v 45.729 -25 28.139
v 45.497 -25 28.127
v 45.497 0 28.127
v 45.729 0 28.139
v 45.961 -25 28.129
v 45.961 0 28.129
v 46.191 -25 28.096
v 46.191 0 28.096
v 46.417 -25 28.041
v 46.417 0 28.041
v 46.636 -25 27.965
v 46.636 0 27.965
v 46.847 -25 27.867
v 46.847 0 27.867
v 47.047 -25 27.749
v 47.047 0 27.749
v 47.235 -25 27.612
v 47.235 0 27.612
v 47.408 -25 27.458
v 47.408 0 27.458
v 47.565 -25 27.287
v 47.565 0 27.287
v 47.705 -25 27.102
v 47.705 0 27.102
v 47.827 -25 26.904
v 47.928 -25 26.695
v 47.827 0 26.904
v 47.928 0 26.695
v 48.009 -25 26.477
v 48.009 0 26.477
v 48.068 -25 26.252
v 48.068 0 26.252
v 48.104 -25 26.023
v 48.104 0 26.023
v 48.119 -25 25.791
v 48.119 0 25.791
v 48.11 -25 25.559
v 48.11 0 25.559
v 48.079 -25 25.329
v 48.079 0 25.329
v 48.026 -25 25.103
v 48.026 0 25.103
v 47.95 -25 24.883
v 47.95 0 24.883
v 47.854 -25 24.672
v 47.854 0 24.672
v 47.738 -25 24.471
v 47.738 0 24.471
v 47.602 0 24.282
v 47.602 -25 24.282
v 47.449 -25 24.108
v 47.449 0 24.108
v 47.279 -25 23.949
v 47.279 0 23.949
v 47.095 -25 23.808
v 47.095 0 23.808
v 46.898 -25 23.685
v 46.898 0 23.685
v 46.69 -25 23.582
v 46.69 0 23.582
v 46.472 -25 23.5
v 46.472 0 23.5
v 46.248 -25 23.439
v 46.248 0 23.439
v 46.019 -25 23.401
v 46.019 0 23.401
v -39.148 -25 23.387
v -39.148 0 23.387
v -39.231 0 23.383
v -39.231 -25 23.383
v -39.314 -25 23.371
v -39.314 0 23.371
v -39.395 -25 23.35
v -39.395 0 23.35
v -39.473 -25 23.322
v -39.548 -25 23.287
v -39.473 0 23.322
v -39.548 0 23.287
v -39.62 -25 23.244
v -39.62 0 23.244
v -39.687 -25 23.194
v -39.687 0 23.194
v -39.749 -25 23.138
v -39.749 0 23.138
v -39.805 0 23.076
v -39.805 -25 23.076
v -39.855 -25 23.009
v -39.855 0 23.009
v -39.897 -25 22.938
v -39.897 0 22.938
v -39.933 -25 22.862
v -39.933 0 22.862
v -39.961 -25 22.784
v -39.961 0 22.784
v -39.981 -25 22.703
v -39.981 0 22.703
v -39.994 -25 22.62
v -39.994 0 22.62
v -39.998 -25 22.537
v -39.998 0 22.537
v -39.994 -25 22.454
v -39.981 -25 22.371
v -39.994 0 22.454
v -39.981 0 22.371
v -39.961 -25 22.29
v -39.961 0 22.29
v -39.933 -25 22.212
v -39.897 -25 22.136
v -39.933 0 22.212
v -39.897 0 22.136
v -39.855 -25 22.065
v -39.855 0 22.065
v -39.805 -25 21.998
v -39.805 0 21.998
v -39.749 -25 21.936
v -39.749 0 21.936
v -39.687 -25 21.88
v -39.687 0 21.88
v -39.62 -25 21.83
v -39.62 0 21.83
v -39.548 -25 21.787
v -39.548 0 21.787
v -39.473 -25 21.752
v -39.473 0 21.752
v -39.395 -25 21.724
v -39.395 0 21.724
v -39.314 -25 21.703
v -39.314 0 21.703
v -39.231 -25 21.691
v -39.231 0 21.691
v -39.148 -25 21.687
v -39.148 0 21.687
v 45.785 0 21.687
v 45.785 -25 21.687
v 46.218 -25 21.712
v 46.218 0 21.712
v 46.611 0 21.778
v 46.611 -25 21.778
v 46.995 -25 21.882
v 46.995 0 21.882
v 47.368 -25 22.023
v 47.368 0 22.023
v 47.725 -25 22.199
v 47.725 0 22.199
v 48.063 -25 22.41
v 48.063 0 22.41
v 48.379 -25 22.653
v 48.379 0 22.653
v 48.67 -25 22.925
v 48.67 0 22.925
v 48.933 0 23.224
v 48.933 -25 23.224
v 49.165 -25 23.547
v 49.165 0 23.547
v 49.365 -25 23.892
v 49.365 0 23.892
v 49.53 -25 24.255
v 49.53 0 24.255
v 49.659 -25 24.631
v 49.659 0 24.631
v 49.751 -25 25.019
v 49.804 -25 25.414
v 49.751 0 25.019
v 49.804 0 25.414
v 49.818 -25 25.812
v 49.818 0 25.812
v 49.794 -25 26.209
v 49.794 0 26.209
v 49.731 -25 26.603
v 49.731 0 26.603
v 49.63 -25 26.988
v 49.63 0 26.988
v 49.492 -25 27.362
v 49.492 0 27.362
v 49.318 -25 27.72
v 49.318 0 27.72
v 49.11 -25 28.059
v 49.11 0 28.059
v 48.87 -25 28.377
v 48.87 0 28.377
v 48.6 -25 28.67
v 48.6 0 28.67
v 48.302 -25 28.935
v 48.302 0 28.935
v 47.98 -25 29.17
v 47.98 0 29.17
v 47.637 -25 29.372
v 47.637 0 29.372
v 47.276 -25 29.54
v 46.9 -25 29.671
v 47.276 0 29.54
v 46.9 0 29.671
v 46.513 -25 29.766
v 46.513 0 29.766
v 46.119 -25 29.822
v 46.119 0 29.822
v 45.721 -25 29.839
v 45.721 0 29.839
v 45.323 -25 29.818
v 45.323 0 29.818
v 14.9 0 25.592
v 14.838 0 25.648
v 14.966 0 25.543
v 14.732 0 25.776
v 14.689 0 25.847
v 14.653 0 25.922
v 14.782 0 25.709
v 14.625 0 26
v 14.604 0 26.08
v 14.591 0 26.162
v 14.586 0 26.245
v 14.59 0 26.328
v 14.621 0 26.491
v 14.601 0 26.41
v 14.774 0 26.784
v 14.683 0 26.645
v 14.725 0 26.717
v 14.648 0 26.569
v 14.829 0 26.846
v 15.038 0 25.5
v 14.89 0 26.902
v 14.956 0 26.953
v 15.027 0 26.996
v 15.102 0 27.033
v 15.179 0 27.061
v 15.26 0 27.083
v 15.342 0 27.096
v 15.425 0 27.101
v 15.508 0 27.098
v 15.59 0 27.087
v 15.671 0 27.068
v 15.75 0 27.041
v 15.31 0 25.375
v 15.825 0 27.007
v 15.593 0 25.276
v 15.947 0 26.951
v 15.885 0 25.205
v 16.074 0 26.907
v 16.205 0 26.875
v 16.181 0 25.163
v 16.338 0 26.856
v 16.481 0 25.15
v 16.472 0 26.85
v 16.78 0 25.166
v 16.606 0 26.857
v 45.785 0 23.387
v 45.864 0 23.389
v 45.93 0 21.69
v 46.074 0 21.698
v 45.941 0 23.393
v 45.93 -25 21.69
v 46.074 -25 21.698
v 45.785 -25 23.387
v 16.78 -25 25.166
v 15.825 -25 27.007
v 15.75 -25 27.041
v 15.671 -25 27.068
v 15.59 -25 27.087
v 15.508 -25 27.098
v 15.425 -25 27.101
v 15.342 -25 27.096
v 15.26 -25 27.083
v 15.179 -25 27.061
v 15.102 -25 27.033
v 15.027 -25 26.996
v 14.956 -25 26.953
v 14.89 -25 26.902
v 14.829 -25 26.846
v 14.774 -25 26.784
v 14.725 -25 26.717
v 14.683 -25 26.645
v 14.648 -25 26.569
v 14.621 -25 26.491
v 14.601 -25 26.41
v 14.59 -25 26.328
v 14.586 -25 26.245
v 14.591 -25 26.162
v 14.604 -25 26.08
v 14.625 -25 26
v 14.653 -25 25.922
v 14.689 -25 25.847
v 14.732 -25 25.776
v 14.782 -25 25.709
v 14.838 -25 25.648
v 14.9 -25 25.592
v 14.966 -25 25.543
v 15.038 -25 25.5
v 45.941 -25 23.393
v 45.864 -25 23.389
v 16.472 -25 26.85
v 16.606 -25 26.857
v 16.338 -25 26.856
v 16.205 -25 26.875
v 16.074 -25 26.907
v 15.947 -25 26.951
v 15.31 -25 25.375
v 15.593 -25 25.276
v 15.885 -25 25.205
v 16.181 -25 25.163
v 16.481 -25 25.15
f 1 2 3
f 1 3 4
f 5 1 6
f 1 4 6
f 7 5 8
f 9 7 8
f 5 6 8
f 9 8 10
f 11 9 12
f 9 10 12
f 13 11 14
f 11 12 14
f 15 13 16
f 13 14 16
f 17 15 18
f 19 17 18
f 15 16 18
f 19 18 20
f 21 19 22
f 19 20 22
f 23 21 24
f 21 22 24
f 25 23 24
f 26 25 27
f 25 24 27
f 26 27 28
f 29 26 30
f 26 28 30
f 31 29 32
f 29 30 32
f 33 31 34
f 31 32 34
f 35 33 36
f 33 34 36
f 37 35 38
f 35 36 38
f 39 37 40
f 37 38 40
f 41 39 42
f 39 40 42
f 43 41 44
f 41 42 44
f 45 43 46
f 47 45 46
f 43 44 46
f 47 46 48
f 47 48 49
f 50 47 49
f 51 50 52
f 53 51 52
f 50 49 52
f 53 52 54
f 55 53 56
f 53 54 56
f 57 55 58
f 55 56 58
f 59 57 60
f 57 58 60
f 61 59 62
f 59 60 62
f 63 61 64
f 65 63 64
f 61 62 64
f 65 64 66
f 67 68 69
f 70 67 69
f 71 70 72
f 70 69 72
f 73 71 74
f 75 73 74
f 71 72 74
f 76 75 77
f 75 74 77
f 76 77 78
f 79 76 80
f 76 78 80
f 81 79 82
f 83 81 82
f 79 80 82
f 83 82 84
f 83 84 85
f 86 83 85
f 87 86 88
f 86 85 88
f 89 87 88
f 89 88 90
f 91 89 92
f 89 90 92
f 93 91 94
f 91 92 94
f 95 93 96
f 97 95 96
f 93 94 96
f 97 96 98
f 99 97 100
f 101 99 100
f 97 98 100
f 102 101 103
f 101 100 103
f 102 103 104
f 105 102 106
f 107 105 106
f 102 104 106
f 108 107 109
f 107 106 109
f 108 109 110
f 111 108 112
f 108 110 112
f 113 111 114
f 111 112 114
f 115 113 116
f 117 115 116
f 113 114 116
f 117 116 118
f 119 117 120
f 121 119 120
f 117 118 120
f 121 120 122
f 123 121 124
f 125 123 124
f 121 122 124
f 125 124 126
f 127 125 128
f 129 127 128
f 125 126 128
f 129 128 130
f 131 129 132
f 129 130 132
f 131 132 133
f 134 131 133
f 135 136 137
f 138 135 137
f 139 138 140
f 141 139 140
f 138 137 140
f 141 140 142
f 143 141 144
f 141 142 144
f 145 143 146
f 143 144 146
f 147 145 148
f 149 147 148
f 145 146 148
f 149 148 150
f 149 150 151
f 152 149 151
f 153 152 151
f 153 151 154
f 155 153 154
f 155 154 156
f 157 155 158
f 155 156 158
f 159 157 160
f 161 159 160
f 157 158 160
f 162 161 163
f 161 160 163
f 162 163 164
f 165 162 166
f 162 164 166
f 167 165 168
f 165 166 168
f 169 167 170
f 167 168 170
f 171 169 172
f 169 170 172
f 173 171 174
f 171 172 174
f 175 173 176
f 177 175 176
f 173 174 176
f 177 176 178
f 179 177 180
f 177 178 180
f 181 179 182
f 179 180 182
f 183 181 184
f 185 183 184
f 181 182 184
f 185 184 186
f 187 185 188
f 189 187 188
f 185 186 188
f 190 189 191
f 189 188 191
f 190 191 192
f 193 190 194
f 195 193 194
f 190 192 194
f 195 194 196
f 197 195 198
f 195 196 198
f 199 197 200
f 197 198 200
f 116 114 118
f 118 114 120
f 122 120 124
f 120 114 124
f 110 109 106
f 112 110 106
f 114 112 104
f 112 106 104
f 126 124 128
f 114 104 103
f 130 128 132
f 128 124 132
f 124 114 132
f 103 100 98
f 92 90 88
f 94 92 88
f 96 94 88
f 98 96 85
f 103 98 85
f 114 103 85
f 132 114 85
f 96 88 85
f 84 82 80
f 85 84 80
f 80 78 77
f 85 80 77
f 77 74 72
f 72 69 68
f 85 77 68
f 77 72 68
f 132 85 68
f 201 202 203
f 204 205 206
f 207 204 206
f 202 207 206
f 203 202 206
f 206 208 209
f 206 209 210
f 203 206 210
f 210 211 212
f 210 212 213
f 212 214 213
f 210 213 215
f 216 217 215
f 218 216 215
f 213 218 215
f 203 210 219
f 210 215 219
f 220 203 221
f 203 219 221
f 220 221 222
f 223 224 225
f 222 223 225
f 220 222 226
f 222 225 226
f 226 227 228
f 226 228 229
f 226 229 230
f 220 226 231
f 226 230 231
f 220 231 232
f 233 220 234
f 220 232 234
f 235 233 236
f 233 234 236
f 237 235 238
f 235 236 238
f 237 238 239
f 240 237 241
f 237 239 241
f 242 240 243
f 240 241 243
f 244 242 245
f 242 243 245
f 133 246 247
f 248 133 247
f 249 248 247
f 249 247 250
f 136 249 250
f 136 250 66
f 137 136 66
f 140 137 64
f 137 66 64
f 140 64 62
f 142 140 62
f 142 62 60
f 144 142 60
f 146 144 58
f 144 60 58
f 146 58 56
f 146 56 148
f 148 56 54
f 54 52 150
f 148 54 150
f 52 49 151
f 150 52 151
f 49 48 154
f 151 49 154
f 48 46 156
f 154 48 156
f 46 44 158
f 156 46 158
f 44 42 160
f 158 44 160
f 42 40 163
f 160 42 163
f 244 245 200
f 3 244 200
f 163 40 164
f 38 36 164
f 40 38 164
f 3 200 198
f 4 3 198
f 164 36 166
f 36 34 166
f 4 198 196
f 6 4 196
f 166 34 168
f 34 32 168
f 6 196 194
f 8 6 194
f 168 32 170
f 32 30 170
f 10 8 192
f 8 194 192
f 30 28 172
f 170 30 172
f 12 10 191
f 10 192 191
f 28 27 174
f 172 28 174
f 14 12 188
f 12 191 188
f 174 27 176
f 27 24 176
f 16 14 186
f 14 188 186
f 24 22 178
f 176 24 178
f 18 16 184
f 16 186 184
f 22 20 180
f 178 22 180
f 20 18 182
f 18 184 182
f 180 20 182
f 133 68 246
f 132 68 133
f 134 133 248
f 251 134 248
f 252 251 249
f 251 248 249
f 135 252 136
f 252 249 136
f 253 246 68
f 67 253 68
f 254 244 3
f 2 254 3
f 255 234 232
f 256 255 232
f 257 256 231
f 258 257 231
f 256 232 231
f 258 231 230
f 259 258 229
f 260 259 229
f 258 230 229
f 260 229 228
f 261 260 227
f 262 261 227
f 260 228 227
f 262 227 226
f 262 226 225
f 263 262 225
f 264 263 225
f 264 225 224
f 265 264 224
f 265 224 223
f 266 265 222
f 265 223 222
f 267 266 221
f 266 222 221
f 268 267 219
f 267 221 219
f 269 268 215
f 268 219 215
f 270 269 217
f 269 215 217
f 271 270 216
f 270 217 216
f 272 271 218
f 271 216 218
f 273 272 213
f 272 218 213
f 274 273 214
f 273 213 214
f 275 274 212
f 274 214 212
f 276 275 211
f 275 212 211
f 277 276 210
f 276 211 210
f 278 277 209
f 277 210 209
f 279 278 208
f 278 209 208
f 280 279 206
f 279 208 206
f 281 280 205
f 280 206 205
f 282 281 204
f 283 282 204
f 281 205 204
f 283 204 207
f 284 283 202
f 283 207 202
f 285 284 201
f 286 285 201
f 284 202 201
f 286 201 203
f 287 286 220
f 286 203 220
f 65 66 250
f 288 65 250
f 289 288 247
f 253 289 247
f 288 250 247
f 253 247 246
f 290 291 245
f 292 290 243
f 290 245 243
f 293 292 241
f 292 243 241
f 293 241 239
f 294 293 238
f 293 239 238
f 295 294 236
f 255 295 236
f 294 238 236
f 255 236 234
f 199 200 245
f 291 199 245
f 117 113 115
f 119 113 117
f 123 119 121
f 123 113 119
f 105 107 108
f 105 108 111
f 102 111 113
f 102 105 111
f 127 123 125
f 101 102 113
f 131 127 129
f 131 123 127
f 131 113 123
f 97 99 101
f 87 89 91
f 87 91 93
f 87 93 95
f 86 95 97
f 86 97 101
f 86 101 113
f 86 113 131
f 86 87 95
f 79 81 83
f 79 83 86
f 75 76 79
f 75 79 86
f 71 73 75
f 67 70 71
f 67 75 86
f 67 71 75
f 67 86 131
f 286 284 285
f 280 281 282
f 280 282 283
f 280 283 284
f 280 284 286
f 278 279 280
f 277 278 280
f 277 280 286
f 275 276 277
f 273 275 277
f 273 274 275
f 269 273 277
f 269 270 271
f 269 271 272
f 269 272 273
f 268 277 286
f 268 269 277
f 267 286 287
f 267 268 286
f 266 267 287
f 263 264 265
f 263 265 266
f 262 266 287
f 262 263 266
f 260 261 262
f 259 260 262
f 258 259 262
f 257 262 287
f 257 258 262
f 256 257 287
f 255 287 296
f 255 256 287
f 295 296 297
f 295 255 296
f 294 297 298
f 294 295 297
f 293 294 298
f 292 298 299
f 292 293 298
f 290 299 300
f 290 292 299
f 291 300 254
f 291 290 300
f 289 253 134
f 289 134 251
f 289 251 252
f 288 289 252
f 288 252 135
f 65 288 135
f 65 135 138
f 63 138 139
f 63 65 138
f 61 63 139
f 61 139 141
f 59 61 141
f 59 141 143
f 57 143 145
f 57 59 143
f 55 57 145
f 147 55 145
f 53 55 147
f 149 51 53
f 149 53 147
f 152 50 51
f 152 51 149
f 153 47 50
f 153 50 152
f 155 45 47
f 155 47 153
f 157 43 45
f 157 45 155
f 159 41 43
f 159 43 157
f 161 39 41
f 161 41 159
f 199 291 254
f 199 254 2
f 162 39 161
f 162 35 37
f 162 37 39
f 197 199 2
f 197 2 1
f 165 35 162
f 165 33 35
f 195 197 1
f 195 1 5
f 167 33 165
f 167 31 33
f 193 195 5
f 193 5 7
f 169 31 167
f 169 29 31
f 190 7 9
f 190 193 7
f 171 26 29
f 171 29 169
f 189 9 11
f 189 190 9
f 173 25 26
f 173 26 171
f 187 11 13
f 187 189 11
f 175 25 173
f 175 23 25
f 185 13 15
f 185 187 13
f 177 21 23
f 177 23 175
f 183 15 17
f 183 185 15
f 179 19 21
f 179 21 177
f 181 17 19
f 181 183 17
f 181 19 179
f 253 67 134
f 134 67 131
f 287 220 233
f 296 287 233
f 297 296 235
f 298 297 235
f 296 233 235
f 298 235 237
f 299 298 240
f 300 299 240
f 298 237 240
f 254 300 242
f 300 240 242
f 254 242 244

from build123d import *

# Parameters (mm, degrees)
F1_DEPTH = 25


with BuildPart() as f1:
    # F0 (on Front) → F1 (new body)
    with BuildSketch(Plane.XZ):
        with BuildLine():
            Line((45.7854280798, 23.3870821038), (-39.147809339, 23.3870821038))
            ThreePointArc((-39.147809339, 23.3870821038), (-39.9978092392, 22.5370822037), (-39.147809339, 21.6870823036))
            Line((-39.147809339, 21.6870823036), (45.7854280798, 21.6870823036))
            ThreePointArc((45.7854280798, 21.6870823036), (46.0020177098, 21.6934270774), (46.2178645223, 21.7124396389))
            ThreePointArc((46.2178645223, 21.7124396389), (49.7941822228, 26.2093447117), (45.3231656181, 29.8179752068))
            Line((45.3231656181, 29.8179752068), (16.6060594099, 26.8574478911))
            ThreePointArc((16.6060594099, 26.8574478911), (16.2045950097, 26.8748577315), (15.8251544566, 27.0071514722))
            ThreePointArc((15.8251544566, 27.0071514722), (14.6830908852, 26.6449018554), (15.037802048, 25.5004744977))
            ThreePointArc((15.037802048, 25.5004744977), (15.8845244931, 25.2052607187), (16.7803932023, 25.1664106207))
            Line((16.7803932023, 25.1664106207), (45.4974994105, 28.1269379365))
            ThreePointArc((45.4974994105, 28.1269379365), (48.1044451468, 26.0228294719), (46.0191775208, 23.4007887723))
            ThreePointArc((46.0191775208, 23.4007887723), (45.9025035618, 23.3905117115), (45.7854280798, 23.3870821038))
        make_face()
    extrude(amount=F1_DEPTH)


solid = f1.part
